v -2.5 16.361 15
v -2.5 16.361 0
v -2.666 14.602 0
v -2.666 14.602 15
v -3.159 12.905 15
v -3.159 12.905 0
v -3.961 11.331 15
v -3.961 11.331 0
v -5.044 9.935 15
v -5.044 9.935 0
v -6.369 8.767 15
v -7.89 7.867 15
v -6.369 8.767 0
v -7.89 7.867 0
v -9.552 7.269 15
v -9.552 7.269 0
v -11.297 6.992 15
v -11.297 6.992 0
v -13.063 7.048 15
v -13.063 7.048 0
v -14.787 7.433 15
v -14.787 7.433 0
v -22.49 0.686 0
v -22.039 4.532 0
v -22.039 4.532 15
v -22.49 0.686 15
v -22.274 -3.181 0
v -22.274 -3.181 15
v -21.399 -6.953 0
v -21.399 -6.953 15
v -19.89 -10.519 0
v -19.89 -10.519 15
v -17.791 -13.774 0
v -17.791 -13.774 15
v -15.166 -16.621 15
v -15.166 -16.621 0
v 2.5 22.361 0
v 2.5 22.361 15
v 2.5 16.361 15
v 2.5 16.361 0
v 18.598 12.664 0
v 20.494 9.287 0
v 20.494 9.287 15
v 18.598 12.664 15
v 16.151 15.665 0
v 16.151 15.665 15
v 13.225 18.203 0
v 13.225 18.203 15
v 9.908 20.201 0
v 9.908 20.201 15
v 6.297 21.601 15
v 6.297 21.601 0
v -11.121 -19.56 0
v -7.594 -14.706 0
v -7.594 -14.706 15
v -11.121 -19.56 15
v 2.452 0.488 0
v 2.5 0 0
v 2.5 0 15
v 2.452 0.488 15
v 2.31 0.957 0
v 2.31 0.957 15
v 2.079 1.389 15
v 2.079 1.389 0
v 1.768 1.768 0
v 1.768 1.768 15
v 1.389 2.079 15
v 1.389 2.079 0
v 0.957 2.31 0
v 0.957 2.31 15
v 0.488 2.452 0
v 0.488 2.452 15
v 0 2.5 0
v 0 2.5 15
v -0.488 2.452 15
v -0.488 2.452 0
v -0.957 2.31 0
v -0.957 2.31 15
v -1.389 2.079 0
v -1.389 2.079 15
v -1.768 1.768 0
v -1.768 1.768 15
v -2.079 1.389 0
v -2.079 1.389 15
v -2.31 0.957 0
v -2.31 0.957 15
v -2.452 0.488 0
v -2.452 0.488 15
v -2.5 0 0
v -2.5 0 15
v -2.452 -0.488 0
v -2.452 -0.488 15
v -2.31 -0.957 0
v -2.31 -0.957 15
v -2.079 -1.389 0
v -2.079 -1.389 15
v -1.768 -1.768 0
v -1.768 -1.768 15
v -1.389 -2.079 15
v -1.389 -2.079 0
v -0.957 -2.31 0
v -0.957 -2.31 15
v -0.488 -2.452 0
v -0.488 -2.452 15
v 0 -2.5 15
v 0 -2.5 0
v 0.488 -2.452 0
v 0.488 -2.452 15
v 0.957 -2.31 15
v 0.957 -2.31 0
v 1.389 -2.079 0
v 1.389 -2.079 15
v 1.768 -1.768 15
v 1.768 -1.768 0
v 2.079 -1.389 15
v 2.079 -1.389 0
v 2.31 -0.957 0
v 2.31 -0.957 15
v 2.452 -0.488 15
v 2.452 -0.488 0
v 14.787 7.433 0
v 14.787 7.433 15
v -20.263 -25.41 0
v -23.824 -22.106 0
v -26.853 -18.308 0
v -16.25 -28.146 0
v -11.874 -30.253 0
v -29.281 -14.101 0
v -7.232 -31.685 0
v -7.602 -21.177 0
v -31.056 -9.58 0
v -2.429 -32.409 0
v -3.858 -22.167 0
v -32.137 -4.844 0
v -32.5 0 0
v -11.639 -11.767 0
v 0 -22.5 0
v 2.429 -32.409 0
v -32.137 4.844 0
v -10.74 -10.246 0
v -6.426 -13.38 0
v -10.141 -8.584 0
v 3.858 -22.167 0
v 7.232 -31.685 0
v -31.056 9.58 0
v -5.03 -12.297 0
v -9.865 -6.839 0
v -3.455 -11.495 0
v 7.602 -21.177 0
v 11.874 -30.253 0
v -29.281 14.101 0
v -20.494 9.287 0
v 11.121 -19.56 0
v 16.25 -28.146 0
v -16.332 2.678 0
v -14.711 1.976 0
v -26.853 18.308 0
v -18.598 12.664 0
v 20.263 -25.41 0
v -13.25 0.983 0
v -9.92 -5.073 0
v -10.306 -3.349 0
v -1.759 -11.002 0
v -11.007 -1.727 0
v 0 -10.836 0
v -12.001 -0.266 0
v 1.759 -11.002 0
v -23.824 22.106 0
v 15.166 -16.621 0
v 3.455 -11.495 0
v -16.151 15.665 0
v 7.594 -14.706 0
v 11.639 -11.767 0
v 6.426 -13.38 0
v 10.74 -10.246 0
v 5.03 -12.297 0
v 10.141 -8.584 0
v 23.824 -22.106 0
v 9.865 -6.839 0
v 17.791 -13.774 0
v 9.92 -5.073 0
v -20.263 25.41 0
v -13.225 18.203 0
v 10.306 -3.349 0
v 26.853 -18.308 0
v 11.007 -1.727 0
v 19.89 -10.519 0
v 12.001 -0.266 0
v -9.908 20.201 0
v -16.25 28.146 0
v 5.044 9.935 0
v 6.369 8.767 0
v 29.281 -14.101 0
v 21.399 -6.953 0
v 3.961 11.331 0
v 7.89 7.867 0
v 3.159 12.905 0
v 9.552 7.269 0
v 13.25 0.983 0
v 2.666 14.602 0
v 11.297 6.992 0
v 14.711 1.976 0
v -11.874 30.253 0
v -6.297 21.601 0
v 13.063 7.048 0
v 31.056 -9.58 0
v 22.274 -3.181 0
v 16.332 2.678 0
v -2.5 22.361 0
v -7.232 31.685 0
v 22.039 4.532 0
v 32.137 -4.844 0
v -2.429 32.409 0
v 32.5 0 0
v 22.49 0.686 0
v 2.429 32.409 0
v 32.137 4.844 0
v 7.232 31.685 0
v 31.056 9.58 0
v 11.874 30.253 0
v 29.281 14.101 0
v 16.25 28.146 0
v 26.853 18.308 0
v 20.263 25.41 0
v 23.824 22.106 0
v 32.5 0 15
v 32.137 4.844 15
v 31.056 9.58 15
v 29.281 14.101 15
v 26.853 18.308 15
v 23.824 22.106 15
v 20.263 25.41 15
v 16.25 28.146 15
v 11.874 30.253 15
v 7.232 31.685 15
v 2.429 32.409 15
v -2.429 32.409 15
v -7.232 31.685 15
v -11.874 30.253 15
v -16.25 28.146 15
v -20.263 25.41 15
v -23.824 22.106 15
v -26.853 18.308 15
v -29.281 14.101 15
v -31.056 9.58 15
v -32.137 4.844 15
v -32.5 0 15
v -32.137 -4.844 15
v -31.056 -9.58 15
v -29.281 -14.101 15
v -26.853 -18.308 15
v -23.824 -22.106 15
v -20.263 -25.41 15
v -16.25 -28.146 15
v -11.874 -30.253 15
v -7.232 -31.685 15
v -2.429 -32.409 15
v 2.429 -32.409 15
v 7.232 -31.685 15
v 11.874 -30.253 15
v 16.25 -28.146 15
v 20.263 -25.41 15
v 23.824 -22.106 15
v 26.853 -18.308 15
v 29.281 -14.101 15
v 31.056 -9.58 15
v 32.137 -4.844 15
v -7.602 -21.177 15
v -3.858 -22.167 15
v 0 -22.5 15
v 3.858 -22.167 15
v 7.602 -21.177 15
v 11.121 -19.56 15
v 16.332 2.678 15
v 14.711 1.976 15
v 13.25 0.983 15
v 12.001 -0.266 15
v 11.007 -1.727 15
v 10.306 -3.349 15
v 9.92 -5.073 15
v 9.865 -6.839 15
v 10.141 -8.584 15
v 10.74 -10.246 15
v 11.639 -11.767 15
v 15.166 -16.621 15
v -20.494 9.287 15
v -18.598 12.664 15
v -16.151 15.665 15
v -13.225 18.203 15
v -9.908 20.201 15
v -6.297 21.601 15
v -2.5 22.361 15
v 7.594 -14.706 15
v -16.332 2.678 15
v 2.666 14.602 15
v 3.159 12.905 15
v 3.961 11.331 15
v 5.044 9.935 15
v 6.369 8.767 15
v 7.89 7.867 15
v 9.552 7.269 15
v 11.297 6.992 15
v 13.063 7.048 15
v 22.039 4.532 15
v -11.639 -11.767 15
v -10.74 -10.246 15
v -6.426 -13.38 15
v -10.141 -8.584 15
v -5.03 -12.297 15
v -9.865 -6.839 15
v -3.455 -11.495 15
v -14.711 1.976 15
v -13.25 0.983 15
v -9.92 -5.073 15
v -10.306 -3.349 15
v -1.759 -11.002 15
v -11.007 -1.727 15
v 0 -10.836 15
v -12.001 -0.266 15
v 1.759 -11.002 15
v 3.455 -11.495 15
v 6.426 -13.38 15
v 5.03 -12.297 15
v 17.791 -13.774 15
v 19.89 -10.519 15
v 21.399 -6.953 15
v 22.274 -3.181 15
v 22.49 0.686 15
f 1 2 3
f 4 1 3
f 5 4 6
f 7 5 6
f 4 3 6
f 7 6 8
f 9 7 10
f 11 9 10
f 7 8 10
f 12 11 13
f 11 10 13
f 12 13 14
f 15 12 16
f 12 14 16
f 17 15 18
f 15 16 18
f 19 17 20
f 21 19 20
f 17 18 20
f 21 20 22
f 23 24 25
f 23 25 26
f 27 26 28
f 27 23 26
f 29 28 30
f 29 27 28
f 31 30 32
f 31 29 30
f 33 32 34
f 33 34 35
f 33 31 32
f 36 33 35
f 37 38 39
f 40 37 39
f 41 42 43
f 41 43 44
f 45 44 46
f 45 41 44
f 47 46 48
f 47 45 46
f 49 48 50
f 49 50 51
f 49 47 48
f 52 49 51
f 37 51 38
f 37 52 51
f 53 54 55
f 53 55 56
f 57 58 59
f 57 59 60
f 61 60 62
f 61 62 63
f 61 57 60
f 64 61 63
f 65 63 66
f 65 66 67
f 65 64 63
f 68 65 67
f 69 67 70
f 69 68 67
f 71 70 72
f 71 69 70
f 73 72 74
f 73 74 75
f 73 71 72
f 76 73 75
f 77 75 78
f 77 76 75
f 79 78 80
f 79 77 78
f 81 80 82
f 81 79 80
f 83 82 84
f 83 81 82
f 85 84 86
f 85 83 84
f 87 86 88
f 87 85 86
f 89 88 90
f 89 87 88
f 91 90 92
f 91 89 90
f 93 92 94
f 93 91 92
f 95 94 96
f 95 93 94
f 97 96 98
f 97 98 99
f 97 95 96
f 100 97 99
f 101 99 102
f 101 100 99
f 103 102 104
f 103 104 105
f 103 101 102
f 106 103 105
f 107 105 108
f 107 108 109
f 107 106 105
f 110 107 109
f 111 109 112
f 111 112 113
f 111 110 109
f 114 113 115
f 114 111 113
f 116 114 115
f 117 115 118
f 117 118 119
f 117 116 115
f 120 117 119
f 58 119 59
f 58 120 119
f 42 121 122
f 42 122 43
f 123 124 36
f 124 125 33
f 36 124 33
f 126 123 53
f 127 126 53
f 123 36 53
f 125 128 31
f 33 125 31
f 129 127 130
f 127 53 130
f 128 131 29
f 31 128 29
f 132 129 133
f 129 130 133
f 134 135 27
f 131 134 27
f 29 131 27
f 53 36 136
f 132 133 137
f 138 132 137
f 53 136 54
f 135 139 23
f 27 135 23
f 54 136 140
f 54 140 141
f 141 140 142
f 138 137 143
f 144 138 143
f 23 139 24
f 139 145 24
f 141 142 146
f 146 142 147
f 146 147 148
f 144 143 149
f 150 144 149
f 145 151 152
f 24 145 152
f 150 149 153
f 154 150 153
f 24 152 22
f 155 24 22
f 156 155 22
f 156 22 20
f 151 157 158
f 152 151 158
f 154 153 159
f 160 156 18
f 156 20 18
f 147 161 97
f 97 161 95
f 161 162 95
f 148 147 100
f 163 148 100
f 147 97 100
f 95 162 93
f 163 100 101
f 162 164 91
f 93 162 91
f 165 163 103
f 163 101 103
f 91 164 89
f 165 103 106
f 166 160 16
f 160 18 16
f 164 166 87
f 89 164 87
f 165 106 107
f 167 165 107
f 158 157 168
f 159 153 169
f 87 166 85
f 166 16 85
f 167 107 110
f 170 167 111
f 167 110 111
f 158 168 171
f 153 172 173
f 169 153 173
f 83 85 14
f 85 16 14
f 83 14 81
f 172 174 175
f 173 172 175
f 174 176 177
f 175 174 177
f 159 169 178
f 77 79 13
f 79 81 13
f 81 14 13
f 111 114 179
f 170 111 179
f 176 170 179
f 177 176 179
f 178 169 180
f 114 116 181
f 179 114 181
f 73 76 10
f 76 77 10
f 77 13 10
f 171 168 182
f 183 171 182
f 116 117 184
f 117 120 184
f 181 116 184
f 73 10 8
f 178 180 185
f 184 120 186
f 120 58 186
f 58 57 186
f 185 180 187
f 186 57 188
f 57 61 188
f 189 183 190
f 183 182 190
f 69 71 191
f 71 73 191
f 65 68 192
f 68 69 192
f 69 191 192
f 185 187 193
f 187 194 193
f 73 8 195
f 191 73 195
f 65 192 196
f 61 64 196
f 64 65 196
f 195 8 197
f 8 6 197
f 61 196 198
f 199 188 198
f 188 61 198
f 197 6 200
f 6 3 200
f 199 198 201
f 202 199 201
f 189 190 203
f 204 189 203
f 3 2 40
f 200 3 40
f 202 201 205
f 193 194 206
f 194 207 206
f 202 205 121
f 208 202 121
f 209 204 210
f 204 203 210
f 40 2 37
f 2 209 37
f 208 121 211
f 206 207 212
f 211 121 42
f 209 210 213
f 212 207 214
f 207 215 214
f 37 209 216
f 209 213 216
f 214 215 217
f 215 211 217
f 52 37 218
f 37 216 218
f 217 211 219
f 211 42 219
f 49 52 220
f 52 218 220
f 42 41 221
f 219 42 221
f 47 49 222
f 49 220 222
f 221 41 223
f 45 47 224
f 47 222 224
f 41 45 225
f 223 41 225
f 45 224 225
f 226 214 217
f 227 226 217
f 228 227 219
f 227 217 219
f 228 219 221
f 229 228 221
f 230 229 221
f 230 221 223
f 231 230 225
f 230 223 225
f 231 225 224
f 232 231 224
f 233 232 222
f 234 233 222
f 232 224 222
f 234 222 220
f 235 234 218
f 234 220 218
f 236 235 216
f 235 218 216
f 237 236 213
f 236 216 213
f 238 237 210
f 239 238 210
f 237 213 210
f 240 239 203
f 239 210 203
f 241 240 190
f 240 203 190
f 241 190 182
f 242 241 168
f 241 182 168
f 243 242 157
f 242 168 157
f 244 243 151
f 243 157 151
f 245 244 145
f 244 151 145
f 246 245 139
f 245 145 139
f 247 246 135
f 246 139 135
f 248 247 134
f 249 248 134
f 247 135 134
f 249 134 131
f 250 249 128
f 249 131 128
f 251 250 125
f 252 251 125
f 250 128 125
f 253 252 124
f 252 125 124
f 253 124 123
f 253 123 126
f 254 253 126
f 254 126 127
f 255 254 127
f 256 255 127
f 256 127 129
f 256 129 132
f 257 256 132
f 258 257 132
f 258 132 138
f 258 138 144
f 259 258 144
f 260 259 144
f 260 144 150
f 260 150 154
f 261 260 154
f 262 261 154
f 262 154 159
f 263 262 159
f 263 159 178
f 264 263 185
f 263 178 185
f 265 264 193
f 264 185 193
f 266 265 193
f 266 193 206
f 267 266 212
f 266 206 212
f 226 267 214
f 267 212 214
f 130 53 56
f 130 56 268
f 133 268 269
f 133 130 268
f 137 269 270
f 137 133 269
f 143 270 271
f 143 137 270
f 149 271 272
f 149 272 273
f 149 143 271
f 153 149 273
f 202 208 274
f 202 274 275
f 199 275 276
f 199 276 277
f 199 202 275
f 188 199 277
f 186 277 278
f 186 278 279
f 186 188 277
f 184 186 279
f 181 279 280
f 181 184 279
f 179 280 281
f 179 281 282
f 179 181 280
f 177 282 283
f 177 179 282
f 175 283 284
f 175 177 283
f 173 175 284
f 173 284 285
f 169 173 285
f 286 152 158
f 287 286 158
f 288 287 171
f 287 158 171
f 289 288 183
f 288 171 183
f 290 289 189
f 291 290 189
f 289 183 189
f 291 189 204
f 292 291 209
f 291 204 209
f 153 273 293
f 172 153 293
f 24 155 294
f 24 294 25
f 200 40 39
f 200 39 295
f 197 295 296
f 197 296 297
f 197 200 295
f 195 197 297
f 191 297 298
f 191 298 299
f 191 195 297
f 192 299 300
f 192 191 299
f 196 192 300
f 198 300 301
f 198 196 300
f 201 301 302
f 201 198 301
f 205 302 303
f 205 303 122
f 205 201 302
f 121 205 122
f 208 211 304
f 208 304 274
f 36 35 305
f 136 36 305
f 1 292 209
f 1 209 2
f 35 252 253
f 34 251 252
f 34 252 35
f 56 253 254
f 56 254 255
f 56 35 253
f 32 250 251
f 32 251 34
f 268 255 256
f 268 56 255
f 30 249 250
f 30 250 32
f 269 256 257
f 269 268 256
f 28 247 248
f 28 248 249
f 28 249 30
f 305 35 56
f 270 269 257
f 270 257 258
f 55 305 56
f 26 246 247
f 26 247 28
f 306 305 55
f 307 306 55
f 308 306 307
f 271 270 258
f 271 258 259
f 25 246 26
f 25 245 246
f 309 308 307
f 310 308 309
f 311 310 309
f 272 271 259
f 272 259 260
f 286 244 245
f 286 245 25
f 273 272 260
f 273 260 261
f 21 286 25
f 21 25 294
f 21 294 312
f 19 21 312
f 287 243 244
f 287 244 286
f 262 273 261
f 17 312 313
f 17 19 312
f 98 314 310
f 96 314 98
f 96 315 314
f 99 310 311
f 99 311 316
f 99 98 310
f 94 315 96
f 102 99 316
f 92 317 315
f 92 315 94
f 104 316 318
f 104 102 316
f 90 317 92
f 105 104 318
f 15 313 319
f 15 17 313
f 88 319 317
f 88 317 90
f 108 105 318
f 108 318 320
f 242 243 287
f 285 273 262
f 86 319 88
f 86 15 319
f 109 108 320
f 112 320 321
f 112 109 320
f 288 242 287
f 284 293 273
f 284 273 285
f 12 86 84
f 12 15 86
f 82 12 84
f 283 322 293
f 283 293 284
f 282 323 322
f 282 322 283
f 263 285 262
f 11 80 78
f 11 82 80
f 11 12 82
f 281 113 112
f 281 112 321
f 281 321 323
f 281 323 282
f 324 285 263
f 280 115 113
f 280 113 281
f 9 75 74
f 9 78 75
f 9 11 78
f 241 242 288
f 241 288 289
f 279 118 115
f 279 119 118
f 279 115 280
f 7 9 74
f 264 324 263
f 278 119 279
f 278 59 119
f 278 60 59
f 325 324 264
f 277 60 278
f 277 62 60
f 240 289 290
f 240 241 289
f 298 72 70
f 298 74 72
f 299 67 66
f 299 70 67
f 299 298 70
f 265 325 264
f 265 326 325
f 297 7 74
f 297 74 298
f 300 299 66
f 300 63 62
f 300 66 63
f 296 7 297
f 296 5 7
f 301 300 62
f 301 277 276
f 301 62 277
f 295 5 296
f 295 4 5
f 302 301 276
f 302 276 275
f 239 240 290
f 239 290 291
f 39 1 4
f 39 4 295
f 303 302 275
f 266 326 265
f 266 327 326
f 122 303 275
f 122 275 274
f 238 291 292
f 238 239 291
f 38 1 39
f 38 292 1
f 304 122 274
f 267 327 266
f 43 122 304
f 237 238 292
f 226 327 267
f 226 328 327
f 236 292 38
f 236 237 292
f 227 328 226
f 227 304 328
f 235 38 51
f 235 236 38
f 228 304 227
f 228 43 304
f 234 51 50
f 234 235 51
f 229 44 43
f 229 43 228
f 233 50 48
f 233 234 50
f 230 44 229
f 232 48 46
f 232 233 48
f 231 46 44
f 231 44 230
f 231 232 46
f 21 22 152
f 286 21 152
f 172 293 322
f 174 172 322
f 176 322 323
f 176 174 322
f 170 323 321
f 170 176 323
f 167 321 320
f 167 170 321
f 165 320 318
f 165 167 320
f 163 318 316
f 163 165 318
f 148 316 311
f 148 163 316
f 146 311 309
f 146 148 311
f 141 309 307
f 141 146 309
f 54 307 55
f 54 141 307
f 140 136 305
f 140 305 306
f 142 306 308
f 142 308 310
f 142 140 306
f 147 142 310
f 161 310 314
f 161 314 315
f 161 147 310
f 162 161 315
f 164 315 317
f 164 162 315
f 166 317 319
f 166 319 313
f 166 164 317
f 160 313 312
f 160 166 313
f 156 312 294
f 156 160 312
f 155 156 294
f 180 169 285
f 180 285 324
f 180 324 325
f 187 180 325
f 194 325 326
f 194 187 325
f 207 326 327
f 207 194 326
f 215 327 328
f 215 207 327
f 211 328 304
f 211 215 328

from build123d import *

# Parameters (mm, degrees)
SKETCH_1_R      = 32.5
SKETCH_1_R_2    = 2.5
EXTRUDE_1_DEPTH = 15


with BuildPart() as part:
    # 草圖1 → 填料-伸長1 (new body)
    with BuildSketch(Plane.XY):
        Circle(SKETCH_1_R)
        Circle(SKETCH_1_R_2, mode=Mode.SUBTRACT)
        with BuildLine():
            Line((-2.5, 22.360679775), (-2.5, 16.360679775))
            ThreePointArc((-2.5, 16.360679775), (-6.369348392, 8.766655972), (-14.787388625, 7.433369381))
            Line((-14.787388625, 7.433369381), (-20.493727723, 9.287471347))
            ThreePointArc((-20.493727723, 9.287471347), (-13.225168177, 18.202882373), (-2.5, 22.360679775))
        make_face(mode=Mode.SUBTRACT)
        with BuildLine():
            Line((2.5, 22.360679775), (2.5, 16.360679775))
            ThreePointArc((2.5, 16.360679775), (6.369348392, 8.766655972), (14.787388625, 7.433369381))
            Line((14.787388625, 7.433369381), (20.493727723, 9.287471347))
            ThreePointArc((20.493727723, 9.287471347), (13.225168177, 18.202882373), (2.5, 22.360679775))
        make_face(mode=Mode.SUBTRACT)
        with BuildLine():
            Line((22.038812695, 4.532188766), (16.332473597, 2.678086799))
            ThreePointArc((16.332473597, 2.678086799), (10.305822184, -3.348564614), (11.639108775, -11.766604847))
            Line((11.639108775, -11.766604847), (15.165820289, -16.620706813))
            ThreePointArc((15.165820289, -16.620706813), (21.398771617, -6.952882373), (22.038812695, 4.532188766))
        make_face(mode=Mode.SUBTRACT)
        with BuildLine():
            Line((11.120735317, -19.559633074), (7.594023803, -14.705531108))
            ThreePointArc((7.594023803, -14.705531108), (0, -10.836182716), (-7.594023803, -14.705531108))
            Line((-7.594023803, -14.705531108), (-11.120735317, -19.559633074))
            ThreePointArc((-11.120735317, -19.559633074), (0, -22.5), (11.120735317, -19.559633074))
        make_face(mode=Mode.SUBTRACT)
        with BuildLine():
            Line((-15.165820289, -16.620706813), (-11.639108775, -11.766604847))
            ThreePointArc((-11.639108775, -11.766604847), (-10.305822184, -3.348564614), (-16.332473597, 2.678086799))
            Line((-16.332473597, 2.678086799), (-22.038812695, 4.532188766))
            ThreePointArc((-22.038812695, 4.532188766), (-21.398771617, -6.952882373), (-15.165820289, -16.620706813))
        make_face(mode=Mode.SUBTRACT)
    extrude(amount=EXTRUDE_1_DEPTH)


solid = part.part
